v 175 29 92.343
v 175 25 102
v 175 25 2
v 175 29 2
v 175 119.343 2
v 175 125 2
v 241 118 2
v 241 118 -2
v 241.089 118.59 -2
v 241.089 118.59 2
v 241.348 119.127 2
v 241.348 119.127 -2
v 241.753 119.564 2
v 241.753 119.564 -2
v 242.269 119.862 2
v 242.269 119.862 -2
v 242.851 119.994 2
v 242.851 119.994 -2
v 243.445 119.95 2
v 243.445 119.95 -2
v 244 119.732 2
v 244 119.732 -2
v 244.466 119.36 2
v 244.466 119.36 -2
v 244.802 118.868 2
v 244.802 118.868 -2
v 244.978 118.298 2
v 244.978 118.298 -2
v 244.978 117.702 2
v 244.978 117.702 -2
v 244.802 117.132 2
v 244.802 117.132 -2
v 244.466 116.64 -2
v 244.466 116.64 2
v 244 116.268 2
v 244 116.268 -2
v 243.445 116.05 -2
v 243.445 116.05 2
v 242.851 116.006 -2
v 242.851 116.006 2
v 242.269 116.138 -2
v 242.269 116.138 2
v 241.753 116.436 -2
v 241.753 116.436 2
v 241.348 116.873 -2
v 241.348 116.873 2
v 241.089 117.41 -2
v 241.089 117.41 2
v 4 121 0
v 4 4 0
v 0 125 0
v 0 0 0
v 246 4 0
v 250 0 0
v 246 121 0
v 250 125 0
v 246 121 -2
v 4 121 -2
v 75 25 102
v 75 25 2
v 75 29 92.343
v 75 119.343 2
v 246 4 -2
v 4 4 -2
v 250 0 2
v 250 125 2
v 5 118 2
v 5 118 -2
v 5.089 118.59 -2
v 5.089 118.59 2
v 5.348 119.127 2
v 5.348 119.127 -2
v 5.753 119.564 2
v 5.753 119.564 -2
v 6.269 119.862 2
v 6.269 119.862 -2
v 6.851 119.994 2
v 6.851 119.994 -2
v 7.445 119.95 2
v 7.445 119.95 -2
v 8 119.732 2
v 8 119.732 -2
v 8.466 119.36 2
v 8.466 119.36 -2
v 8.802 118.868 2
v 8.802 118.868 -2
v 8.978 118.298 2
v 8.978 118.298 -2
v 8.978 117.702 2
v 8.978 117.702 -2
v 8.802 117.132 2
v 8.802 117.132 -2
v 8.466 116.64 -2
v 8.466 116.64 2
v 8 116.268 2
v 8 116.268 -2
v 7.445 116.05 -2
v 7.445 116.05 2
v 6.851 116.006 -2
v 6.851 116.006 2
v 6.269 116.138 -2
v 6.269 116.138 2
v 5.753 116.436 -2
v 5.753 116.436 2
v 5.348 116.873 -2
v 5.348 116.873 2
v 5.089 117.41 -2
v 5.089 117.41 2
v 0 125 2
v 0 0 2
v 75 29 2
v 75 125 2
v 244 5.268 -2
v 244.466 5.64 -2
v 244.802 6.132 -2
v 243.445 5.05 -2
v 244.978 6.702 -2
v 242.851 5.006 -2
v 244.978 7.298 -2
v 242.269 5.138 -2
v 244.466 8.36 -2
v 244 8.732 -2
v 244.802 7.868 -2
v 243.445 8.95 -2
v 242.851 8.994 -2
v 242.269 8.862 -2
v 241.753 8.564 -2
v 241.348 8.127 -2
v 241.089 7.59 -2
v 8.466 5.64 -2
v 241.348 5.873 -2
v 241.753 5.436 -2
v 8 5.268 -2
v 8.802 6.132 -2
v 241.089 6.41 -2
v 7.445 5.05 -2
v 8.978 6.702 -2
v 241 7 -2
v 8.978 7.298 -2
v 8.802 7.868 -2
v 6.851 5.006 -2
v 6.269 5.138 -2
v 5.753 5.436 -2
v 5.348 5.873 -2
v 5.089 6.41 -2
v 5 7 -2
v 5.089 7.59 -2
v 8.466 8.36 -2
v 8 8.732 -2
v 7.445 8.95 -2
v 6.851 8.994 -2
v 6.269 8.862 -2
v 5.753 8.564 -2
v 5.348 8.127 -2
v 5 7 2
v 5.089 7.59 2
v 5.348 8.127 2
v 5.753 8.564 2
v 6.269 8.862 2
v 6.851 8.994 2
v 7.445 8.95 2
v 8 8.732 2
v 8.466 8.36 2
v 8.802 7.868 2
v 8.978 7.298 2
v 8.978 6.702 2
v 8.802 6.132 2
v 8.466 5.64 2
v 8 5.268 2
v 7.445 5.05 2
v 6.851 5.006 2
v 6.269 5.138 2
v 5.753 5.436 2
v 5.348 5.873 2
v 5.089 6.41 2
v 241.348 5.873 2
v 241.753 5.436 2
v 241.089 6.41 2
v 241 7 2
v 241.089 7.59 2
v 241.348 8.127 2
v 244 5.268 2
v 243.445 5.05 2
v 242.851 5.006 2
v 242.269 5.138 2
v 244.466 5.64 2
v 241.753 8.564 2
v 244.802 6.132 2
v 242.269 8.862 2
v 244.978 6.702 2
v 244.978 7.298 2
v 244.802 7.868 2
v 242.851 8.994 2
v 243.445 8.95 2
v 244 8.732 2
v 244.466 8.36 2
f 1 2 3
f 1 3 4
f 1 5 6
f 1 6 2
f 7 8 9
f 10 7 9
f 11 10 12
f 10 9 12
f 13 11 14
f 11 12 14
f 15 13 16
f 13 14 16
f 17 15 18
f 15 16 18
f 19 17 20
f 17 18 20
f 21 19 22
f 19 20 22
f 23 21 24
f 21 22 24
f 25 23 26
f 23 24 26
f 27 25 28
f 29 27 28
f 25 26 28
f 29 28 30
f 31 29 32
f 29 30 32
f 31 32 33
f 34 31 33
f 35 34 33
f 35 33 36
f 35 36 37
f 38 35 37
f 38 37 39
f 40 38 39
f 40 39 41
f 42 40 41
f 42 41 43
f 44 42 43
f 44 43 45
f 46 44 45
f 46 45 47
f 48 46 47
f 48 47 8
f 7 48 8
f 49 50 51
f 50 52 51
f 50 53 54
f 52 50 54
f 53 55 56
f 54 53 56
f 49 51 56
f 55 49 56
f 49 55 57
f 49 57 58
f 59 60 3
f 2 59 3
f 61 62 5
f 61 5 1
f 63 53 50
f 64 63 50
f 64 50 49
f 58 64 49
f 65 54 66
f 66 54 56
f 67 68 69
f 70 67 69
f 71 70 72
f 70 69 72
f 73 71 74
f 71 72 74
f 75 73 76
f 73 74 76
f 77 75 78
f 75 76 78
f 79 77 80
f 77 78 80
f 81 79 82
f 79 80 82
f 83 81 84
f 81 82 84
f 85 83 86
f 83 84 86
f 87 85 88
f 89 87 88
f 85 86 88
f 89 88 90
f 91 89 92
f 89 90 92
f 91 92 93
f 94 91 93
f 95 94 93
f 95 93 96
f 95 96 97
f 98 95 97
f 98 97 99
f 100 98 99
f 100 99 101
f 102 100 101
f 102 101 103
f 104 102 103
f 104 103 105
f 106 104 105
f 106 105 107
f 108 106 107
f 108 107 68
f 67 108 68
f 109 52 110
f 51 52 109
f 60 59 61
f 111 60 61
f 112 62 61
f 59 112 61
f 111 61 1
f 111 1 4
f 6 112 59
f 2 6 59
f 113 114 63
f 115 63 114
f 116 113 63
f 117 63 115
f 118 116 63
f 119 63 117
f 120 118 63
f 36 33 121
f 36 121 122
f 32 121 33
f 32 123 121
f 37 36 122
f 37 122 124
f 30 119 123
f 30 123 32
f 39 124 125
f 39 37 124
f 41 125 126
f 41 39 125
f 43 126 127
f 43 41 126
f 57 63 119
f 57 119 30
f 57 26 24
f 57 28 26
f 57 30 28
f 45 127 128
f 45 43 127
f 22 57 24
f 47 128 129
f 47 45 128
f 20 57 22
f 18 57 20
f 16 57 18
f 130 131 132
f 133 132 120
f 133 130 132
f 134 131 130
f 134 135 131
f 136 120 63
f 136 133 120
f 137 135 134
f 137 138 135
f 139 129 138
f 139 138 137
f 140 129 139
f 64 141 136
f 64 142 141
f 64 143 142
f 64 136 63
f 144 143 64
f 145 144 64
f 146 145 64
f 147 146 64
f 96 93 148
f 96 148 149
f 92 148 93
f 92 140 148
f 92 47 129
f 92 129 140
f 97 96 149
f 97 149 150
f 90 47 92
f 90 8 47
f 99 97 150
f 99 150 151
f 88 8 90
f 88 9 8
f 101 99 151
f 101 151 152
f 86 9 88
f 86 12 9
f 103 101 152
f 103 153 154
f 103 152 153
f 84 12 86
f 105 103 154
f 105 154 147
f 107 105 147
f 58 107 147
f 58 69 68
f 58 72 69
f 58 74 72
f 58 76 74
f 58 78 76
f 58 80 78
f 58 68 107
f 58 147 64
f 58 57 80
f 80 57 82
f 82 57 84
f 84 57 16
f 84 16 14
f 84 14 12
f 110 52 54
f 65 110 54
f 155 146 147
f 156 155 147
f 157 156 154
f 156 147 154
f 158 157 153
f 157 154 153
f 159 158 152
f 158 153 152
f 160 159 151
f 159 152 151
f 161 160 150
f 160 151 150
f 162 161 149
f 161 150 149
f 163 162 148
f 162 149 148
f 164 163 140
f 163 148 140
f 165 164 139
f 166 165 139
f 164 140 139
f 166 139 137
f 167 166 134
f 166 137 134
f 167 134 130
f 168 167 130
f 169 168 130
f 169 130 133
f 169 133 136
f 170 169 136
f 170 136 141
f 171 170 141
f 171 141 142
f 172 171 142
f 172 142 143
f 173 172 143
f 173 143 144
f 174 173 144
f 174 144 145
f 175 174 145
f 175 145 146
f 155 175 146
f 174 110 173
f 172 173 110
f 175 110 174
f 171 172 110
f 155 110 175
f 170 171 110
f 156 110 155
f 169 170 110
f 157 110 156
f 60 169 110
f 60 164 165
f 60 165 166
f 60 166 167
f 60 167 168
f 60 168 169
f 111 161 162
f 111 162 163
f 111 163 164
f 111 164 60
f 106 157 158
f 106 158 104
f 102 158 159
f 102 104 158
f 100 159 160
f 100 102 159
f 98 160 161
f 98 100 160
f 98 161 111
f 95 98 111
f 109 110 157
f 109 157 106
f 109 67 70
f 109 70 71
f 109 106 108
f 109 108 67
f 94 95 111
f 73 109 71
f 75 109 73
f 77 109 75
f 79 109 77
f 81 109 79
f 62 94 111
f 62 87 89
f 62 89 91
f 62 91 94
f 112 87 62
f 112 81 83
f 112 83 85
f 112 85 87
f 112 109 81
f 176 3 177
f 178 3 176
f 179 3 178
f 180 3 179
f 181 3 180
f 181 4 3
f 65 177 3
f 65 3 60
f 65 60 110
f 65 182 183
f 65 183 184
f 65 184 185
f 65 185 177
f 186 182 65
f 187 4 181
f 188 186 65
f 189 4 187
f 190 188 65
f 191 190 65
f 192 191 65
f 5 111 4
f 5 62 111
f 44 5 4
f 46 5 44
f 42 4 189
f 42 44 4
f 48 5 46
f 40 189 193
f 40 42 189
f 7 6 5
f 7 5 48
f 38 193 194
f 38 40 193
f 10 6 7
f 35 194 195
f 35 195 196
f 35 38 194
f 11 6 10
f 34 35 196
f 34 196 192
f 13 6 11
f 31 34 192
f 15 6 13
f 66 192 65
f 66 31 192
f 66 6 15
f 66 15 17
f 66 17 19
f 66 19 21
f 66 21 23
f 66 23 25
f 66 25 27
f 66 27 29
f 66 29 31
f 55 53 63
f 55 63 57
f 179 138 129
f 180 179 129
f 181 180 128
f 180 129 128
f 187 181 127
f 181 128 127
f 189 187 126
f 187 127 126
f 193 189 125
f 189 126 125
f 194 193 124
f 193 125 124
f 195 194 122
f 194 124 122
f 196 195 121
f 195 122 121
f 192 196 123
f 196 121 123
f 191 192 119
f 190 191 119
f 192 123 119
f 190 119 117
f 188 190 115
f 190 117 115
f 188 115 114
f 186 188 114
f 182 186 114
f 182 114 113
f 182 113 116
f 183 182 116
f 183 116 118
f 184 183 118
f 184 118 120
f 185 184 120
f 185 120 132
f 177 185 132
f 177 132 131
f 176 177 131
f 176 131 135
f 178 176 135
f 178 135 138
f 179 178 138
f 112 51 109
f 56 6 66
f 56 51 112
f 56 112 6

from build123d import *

# Parameters (mm, degrees)
SKIZZE1_W                       = 250
SKIZZE1_H                       = 125
AUFSATZ_LINEAR_AUSTRAGEN1_DEPTH = 2
SKIZZE2_W                       = 100
SKIZZE2_H                       = 100
AUFSATZ_LINEAR_AUSTRAGEN2_DEPTH = 100
SCHNITT_LINEAR_AUSTRAGEN1_DEPTH = 100
SCHNITT_LINEAR_AUSTRAGEN2_DEPTH = 100
SKIZZE6_W                       = 242
SKIZZE6_H                       = 117
AUFSATZ_LINEAR_AUSTRAGEN3_DEPTH = 2
SKIZZE7_R                       = 2
SCHNITT_LINEAR_AUSTRAGEN5_DEPTH = 32


with BuildPart() as part:
    # Skizze1 → Aufsatz-Linear austragen1 (new body)
    with BuildSketch(Plane.XY):
        with Locations((125, 62.5)):
            Rectangle(SKIZZE1_W, SKIZZE1_H)
    extrude(amount=AUFSATZ_LINEAR_AUSTRAGEN1_DEPTH)

    # Skizze2 → Aufsatz-Linear austragen2 (add)
    with BuildSketch(Plane.XY.offset(2)):
        with Locations((125, 75)):
            Rectangle(SKIZZE2_W, SKIZZE2_H)
    extrude(amount=AUFSATZ_LINEAR_AUSTRAGEN2_DEPTH)

    # Skizze3 → Schnitt-Linear austragen1 (cut)
    with BuildSketch(Plane.ZY.offset(-75)):
        Polygon((102, 25), (102, 125), (2, 125), align=None)
    extrude(amount=-SCHNITT_LINEAR_AUSTRAGEN1_DEPTH, mode=Mode.SUBTRACT)

    # Skizze4 → Schnitt-Linear austragen2 (cut)
    with BuildSketch(Plane.ZY.offset(-75)):
        Polygon((2, 119.343145751), (92.343145751, 29), (2, 29), align=None)
    extrude(amount=-SCHNITT_LINEAR_AUSTRAGEN2_DEPTH, mode=Mode.SUBTRACT)

    # Skizze6 → Aufsatz-Linear austragen3 (add)
    with BuildSketch(Plane(origin=(0, 0, 0), x_dir=(-1, 0, 0), z_dir=(0, 0, -1))):
        with Locations((-125, 62.5)):
            Rectangle(SKIZZE6_W, SKIZZE6_H)
    extrude(amount=AUFSATZ_LINEAR_AUSTRAGEN3_DEPTH)

    # Skizze7 → Schnitt-Linear austragen5 (cut)
    with BuildSketch(Plane(origin=(0, 0, -2), x_dir=(-1, 0, 0), z_dir=(0, 0, -1))):
        with Locations((-243, 118)):
            Circle(SKIZZE7_R)
        with Locations((-7, 7)):
            Circle(SKIZZE7_R)
        with Locations((-7, 118)):
            Circle(SKIZZE7_R)
        with Locations((-243, 7)):
            Circle(SKIZZE7_R)
    extrude(amount=-SCHNITT_LINEAR_AUSTRAGEN5_DEPTH, mode=Mode.SUBTRACT)


solid = part.part
